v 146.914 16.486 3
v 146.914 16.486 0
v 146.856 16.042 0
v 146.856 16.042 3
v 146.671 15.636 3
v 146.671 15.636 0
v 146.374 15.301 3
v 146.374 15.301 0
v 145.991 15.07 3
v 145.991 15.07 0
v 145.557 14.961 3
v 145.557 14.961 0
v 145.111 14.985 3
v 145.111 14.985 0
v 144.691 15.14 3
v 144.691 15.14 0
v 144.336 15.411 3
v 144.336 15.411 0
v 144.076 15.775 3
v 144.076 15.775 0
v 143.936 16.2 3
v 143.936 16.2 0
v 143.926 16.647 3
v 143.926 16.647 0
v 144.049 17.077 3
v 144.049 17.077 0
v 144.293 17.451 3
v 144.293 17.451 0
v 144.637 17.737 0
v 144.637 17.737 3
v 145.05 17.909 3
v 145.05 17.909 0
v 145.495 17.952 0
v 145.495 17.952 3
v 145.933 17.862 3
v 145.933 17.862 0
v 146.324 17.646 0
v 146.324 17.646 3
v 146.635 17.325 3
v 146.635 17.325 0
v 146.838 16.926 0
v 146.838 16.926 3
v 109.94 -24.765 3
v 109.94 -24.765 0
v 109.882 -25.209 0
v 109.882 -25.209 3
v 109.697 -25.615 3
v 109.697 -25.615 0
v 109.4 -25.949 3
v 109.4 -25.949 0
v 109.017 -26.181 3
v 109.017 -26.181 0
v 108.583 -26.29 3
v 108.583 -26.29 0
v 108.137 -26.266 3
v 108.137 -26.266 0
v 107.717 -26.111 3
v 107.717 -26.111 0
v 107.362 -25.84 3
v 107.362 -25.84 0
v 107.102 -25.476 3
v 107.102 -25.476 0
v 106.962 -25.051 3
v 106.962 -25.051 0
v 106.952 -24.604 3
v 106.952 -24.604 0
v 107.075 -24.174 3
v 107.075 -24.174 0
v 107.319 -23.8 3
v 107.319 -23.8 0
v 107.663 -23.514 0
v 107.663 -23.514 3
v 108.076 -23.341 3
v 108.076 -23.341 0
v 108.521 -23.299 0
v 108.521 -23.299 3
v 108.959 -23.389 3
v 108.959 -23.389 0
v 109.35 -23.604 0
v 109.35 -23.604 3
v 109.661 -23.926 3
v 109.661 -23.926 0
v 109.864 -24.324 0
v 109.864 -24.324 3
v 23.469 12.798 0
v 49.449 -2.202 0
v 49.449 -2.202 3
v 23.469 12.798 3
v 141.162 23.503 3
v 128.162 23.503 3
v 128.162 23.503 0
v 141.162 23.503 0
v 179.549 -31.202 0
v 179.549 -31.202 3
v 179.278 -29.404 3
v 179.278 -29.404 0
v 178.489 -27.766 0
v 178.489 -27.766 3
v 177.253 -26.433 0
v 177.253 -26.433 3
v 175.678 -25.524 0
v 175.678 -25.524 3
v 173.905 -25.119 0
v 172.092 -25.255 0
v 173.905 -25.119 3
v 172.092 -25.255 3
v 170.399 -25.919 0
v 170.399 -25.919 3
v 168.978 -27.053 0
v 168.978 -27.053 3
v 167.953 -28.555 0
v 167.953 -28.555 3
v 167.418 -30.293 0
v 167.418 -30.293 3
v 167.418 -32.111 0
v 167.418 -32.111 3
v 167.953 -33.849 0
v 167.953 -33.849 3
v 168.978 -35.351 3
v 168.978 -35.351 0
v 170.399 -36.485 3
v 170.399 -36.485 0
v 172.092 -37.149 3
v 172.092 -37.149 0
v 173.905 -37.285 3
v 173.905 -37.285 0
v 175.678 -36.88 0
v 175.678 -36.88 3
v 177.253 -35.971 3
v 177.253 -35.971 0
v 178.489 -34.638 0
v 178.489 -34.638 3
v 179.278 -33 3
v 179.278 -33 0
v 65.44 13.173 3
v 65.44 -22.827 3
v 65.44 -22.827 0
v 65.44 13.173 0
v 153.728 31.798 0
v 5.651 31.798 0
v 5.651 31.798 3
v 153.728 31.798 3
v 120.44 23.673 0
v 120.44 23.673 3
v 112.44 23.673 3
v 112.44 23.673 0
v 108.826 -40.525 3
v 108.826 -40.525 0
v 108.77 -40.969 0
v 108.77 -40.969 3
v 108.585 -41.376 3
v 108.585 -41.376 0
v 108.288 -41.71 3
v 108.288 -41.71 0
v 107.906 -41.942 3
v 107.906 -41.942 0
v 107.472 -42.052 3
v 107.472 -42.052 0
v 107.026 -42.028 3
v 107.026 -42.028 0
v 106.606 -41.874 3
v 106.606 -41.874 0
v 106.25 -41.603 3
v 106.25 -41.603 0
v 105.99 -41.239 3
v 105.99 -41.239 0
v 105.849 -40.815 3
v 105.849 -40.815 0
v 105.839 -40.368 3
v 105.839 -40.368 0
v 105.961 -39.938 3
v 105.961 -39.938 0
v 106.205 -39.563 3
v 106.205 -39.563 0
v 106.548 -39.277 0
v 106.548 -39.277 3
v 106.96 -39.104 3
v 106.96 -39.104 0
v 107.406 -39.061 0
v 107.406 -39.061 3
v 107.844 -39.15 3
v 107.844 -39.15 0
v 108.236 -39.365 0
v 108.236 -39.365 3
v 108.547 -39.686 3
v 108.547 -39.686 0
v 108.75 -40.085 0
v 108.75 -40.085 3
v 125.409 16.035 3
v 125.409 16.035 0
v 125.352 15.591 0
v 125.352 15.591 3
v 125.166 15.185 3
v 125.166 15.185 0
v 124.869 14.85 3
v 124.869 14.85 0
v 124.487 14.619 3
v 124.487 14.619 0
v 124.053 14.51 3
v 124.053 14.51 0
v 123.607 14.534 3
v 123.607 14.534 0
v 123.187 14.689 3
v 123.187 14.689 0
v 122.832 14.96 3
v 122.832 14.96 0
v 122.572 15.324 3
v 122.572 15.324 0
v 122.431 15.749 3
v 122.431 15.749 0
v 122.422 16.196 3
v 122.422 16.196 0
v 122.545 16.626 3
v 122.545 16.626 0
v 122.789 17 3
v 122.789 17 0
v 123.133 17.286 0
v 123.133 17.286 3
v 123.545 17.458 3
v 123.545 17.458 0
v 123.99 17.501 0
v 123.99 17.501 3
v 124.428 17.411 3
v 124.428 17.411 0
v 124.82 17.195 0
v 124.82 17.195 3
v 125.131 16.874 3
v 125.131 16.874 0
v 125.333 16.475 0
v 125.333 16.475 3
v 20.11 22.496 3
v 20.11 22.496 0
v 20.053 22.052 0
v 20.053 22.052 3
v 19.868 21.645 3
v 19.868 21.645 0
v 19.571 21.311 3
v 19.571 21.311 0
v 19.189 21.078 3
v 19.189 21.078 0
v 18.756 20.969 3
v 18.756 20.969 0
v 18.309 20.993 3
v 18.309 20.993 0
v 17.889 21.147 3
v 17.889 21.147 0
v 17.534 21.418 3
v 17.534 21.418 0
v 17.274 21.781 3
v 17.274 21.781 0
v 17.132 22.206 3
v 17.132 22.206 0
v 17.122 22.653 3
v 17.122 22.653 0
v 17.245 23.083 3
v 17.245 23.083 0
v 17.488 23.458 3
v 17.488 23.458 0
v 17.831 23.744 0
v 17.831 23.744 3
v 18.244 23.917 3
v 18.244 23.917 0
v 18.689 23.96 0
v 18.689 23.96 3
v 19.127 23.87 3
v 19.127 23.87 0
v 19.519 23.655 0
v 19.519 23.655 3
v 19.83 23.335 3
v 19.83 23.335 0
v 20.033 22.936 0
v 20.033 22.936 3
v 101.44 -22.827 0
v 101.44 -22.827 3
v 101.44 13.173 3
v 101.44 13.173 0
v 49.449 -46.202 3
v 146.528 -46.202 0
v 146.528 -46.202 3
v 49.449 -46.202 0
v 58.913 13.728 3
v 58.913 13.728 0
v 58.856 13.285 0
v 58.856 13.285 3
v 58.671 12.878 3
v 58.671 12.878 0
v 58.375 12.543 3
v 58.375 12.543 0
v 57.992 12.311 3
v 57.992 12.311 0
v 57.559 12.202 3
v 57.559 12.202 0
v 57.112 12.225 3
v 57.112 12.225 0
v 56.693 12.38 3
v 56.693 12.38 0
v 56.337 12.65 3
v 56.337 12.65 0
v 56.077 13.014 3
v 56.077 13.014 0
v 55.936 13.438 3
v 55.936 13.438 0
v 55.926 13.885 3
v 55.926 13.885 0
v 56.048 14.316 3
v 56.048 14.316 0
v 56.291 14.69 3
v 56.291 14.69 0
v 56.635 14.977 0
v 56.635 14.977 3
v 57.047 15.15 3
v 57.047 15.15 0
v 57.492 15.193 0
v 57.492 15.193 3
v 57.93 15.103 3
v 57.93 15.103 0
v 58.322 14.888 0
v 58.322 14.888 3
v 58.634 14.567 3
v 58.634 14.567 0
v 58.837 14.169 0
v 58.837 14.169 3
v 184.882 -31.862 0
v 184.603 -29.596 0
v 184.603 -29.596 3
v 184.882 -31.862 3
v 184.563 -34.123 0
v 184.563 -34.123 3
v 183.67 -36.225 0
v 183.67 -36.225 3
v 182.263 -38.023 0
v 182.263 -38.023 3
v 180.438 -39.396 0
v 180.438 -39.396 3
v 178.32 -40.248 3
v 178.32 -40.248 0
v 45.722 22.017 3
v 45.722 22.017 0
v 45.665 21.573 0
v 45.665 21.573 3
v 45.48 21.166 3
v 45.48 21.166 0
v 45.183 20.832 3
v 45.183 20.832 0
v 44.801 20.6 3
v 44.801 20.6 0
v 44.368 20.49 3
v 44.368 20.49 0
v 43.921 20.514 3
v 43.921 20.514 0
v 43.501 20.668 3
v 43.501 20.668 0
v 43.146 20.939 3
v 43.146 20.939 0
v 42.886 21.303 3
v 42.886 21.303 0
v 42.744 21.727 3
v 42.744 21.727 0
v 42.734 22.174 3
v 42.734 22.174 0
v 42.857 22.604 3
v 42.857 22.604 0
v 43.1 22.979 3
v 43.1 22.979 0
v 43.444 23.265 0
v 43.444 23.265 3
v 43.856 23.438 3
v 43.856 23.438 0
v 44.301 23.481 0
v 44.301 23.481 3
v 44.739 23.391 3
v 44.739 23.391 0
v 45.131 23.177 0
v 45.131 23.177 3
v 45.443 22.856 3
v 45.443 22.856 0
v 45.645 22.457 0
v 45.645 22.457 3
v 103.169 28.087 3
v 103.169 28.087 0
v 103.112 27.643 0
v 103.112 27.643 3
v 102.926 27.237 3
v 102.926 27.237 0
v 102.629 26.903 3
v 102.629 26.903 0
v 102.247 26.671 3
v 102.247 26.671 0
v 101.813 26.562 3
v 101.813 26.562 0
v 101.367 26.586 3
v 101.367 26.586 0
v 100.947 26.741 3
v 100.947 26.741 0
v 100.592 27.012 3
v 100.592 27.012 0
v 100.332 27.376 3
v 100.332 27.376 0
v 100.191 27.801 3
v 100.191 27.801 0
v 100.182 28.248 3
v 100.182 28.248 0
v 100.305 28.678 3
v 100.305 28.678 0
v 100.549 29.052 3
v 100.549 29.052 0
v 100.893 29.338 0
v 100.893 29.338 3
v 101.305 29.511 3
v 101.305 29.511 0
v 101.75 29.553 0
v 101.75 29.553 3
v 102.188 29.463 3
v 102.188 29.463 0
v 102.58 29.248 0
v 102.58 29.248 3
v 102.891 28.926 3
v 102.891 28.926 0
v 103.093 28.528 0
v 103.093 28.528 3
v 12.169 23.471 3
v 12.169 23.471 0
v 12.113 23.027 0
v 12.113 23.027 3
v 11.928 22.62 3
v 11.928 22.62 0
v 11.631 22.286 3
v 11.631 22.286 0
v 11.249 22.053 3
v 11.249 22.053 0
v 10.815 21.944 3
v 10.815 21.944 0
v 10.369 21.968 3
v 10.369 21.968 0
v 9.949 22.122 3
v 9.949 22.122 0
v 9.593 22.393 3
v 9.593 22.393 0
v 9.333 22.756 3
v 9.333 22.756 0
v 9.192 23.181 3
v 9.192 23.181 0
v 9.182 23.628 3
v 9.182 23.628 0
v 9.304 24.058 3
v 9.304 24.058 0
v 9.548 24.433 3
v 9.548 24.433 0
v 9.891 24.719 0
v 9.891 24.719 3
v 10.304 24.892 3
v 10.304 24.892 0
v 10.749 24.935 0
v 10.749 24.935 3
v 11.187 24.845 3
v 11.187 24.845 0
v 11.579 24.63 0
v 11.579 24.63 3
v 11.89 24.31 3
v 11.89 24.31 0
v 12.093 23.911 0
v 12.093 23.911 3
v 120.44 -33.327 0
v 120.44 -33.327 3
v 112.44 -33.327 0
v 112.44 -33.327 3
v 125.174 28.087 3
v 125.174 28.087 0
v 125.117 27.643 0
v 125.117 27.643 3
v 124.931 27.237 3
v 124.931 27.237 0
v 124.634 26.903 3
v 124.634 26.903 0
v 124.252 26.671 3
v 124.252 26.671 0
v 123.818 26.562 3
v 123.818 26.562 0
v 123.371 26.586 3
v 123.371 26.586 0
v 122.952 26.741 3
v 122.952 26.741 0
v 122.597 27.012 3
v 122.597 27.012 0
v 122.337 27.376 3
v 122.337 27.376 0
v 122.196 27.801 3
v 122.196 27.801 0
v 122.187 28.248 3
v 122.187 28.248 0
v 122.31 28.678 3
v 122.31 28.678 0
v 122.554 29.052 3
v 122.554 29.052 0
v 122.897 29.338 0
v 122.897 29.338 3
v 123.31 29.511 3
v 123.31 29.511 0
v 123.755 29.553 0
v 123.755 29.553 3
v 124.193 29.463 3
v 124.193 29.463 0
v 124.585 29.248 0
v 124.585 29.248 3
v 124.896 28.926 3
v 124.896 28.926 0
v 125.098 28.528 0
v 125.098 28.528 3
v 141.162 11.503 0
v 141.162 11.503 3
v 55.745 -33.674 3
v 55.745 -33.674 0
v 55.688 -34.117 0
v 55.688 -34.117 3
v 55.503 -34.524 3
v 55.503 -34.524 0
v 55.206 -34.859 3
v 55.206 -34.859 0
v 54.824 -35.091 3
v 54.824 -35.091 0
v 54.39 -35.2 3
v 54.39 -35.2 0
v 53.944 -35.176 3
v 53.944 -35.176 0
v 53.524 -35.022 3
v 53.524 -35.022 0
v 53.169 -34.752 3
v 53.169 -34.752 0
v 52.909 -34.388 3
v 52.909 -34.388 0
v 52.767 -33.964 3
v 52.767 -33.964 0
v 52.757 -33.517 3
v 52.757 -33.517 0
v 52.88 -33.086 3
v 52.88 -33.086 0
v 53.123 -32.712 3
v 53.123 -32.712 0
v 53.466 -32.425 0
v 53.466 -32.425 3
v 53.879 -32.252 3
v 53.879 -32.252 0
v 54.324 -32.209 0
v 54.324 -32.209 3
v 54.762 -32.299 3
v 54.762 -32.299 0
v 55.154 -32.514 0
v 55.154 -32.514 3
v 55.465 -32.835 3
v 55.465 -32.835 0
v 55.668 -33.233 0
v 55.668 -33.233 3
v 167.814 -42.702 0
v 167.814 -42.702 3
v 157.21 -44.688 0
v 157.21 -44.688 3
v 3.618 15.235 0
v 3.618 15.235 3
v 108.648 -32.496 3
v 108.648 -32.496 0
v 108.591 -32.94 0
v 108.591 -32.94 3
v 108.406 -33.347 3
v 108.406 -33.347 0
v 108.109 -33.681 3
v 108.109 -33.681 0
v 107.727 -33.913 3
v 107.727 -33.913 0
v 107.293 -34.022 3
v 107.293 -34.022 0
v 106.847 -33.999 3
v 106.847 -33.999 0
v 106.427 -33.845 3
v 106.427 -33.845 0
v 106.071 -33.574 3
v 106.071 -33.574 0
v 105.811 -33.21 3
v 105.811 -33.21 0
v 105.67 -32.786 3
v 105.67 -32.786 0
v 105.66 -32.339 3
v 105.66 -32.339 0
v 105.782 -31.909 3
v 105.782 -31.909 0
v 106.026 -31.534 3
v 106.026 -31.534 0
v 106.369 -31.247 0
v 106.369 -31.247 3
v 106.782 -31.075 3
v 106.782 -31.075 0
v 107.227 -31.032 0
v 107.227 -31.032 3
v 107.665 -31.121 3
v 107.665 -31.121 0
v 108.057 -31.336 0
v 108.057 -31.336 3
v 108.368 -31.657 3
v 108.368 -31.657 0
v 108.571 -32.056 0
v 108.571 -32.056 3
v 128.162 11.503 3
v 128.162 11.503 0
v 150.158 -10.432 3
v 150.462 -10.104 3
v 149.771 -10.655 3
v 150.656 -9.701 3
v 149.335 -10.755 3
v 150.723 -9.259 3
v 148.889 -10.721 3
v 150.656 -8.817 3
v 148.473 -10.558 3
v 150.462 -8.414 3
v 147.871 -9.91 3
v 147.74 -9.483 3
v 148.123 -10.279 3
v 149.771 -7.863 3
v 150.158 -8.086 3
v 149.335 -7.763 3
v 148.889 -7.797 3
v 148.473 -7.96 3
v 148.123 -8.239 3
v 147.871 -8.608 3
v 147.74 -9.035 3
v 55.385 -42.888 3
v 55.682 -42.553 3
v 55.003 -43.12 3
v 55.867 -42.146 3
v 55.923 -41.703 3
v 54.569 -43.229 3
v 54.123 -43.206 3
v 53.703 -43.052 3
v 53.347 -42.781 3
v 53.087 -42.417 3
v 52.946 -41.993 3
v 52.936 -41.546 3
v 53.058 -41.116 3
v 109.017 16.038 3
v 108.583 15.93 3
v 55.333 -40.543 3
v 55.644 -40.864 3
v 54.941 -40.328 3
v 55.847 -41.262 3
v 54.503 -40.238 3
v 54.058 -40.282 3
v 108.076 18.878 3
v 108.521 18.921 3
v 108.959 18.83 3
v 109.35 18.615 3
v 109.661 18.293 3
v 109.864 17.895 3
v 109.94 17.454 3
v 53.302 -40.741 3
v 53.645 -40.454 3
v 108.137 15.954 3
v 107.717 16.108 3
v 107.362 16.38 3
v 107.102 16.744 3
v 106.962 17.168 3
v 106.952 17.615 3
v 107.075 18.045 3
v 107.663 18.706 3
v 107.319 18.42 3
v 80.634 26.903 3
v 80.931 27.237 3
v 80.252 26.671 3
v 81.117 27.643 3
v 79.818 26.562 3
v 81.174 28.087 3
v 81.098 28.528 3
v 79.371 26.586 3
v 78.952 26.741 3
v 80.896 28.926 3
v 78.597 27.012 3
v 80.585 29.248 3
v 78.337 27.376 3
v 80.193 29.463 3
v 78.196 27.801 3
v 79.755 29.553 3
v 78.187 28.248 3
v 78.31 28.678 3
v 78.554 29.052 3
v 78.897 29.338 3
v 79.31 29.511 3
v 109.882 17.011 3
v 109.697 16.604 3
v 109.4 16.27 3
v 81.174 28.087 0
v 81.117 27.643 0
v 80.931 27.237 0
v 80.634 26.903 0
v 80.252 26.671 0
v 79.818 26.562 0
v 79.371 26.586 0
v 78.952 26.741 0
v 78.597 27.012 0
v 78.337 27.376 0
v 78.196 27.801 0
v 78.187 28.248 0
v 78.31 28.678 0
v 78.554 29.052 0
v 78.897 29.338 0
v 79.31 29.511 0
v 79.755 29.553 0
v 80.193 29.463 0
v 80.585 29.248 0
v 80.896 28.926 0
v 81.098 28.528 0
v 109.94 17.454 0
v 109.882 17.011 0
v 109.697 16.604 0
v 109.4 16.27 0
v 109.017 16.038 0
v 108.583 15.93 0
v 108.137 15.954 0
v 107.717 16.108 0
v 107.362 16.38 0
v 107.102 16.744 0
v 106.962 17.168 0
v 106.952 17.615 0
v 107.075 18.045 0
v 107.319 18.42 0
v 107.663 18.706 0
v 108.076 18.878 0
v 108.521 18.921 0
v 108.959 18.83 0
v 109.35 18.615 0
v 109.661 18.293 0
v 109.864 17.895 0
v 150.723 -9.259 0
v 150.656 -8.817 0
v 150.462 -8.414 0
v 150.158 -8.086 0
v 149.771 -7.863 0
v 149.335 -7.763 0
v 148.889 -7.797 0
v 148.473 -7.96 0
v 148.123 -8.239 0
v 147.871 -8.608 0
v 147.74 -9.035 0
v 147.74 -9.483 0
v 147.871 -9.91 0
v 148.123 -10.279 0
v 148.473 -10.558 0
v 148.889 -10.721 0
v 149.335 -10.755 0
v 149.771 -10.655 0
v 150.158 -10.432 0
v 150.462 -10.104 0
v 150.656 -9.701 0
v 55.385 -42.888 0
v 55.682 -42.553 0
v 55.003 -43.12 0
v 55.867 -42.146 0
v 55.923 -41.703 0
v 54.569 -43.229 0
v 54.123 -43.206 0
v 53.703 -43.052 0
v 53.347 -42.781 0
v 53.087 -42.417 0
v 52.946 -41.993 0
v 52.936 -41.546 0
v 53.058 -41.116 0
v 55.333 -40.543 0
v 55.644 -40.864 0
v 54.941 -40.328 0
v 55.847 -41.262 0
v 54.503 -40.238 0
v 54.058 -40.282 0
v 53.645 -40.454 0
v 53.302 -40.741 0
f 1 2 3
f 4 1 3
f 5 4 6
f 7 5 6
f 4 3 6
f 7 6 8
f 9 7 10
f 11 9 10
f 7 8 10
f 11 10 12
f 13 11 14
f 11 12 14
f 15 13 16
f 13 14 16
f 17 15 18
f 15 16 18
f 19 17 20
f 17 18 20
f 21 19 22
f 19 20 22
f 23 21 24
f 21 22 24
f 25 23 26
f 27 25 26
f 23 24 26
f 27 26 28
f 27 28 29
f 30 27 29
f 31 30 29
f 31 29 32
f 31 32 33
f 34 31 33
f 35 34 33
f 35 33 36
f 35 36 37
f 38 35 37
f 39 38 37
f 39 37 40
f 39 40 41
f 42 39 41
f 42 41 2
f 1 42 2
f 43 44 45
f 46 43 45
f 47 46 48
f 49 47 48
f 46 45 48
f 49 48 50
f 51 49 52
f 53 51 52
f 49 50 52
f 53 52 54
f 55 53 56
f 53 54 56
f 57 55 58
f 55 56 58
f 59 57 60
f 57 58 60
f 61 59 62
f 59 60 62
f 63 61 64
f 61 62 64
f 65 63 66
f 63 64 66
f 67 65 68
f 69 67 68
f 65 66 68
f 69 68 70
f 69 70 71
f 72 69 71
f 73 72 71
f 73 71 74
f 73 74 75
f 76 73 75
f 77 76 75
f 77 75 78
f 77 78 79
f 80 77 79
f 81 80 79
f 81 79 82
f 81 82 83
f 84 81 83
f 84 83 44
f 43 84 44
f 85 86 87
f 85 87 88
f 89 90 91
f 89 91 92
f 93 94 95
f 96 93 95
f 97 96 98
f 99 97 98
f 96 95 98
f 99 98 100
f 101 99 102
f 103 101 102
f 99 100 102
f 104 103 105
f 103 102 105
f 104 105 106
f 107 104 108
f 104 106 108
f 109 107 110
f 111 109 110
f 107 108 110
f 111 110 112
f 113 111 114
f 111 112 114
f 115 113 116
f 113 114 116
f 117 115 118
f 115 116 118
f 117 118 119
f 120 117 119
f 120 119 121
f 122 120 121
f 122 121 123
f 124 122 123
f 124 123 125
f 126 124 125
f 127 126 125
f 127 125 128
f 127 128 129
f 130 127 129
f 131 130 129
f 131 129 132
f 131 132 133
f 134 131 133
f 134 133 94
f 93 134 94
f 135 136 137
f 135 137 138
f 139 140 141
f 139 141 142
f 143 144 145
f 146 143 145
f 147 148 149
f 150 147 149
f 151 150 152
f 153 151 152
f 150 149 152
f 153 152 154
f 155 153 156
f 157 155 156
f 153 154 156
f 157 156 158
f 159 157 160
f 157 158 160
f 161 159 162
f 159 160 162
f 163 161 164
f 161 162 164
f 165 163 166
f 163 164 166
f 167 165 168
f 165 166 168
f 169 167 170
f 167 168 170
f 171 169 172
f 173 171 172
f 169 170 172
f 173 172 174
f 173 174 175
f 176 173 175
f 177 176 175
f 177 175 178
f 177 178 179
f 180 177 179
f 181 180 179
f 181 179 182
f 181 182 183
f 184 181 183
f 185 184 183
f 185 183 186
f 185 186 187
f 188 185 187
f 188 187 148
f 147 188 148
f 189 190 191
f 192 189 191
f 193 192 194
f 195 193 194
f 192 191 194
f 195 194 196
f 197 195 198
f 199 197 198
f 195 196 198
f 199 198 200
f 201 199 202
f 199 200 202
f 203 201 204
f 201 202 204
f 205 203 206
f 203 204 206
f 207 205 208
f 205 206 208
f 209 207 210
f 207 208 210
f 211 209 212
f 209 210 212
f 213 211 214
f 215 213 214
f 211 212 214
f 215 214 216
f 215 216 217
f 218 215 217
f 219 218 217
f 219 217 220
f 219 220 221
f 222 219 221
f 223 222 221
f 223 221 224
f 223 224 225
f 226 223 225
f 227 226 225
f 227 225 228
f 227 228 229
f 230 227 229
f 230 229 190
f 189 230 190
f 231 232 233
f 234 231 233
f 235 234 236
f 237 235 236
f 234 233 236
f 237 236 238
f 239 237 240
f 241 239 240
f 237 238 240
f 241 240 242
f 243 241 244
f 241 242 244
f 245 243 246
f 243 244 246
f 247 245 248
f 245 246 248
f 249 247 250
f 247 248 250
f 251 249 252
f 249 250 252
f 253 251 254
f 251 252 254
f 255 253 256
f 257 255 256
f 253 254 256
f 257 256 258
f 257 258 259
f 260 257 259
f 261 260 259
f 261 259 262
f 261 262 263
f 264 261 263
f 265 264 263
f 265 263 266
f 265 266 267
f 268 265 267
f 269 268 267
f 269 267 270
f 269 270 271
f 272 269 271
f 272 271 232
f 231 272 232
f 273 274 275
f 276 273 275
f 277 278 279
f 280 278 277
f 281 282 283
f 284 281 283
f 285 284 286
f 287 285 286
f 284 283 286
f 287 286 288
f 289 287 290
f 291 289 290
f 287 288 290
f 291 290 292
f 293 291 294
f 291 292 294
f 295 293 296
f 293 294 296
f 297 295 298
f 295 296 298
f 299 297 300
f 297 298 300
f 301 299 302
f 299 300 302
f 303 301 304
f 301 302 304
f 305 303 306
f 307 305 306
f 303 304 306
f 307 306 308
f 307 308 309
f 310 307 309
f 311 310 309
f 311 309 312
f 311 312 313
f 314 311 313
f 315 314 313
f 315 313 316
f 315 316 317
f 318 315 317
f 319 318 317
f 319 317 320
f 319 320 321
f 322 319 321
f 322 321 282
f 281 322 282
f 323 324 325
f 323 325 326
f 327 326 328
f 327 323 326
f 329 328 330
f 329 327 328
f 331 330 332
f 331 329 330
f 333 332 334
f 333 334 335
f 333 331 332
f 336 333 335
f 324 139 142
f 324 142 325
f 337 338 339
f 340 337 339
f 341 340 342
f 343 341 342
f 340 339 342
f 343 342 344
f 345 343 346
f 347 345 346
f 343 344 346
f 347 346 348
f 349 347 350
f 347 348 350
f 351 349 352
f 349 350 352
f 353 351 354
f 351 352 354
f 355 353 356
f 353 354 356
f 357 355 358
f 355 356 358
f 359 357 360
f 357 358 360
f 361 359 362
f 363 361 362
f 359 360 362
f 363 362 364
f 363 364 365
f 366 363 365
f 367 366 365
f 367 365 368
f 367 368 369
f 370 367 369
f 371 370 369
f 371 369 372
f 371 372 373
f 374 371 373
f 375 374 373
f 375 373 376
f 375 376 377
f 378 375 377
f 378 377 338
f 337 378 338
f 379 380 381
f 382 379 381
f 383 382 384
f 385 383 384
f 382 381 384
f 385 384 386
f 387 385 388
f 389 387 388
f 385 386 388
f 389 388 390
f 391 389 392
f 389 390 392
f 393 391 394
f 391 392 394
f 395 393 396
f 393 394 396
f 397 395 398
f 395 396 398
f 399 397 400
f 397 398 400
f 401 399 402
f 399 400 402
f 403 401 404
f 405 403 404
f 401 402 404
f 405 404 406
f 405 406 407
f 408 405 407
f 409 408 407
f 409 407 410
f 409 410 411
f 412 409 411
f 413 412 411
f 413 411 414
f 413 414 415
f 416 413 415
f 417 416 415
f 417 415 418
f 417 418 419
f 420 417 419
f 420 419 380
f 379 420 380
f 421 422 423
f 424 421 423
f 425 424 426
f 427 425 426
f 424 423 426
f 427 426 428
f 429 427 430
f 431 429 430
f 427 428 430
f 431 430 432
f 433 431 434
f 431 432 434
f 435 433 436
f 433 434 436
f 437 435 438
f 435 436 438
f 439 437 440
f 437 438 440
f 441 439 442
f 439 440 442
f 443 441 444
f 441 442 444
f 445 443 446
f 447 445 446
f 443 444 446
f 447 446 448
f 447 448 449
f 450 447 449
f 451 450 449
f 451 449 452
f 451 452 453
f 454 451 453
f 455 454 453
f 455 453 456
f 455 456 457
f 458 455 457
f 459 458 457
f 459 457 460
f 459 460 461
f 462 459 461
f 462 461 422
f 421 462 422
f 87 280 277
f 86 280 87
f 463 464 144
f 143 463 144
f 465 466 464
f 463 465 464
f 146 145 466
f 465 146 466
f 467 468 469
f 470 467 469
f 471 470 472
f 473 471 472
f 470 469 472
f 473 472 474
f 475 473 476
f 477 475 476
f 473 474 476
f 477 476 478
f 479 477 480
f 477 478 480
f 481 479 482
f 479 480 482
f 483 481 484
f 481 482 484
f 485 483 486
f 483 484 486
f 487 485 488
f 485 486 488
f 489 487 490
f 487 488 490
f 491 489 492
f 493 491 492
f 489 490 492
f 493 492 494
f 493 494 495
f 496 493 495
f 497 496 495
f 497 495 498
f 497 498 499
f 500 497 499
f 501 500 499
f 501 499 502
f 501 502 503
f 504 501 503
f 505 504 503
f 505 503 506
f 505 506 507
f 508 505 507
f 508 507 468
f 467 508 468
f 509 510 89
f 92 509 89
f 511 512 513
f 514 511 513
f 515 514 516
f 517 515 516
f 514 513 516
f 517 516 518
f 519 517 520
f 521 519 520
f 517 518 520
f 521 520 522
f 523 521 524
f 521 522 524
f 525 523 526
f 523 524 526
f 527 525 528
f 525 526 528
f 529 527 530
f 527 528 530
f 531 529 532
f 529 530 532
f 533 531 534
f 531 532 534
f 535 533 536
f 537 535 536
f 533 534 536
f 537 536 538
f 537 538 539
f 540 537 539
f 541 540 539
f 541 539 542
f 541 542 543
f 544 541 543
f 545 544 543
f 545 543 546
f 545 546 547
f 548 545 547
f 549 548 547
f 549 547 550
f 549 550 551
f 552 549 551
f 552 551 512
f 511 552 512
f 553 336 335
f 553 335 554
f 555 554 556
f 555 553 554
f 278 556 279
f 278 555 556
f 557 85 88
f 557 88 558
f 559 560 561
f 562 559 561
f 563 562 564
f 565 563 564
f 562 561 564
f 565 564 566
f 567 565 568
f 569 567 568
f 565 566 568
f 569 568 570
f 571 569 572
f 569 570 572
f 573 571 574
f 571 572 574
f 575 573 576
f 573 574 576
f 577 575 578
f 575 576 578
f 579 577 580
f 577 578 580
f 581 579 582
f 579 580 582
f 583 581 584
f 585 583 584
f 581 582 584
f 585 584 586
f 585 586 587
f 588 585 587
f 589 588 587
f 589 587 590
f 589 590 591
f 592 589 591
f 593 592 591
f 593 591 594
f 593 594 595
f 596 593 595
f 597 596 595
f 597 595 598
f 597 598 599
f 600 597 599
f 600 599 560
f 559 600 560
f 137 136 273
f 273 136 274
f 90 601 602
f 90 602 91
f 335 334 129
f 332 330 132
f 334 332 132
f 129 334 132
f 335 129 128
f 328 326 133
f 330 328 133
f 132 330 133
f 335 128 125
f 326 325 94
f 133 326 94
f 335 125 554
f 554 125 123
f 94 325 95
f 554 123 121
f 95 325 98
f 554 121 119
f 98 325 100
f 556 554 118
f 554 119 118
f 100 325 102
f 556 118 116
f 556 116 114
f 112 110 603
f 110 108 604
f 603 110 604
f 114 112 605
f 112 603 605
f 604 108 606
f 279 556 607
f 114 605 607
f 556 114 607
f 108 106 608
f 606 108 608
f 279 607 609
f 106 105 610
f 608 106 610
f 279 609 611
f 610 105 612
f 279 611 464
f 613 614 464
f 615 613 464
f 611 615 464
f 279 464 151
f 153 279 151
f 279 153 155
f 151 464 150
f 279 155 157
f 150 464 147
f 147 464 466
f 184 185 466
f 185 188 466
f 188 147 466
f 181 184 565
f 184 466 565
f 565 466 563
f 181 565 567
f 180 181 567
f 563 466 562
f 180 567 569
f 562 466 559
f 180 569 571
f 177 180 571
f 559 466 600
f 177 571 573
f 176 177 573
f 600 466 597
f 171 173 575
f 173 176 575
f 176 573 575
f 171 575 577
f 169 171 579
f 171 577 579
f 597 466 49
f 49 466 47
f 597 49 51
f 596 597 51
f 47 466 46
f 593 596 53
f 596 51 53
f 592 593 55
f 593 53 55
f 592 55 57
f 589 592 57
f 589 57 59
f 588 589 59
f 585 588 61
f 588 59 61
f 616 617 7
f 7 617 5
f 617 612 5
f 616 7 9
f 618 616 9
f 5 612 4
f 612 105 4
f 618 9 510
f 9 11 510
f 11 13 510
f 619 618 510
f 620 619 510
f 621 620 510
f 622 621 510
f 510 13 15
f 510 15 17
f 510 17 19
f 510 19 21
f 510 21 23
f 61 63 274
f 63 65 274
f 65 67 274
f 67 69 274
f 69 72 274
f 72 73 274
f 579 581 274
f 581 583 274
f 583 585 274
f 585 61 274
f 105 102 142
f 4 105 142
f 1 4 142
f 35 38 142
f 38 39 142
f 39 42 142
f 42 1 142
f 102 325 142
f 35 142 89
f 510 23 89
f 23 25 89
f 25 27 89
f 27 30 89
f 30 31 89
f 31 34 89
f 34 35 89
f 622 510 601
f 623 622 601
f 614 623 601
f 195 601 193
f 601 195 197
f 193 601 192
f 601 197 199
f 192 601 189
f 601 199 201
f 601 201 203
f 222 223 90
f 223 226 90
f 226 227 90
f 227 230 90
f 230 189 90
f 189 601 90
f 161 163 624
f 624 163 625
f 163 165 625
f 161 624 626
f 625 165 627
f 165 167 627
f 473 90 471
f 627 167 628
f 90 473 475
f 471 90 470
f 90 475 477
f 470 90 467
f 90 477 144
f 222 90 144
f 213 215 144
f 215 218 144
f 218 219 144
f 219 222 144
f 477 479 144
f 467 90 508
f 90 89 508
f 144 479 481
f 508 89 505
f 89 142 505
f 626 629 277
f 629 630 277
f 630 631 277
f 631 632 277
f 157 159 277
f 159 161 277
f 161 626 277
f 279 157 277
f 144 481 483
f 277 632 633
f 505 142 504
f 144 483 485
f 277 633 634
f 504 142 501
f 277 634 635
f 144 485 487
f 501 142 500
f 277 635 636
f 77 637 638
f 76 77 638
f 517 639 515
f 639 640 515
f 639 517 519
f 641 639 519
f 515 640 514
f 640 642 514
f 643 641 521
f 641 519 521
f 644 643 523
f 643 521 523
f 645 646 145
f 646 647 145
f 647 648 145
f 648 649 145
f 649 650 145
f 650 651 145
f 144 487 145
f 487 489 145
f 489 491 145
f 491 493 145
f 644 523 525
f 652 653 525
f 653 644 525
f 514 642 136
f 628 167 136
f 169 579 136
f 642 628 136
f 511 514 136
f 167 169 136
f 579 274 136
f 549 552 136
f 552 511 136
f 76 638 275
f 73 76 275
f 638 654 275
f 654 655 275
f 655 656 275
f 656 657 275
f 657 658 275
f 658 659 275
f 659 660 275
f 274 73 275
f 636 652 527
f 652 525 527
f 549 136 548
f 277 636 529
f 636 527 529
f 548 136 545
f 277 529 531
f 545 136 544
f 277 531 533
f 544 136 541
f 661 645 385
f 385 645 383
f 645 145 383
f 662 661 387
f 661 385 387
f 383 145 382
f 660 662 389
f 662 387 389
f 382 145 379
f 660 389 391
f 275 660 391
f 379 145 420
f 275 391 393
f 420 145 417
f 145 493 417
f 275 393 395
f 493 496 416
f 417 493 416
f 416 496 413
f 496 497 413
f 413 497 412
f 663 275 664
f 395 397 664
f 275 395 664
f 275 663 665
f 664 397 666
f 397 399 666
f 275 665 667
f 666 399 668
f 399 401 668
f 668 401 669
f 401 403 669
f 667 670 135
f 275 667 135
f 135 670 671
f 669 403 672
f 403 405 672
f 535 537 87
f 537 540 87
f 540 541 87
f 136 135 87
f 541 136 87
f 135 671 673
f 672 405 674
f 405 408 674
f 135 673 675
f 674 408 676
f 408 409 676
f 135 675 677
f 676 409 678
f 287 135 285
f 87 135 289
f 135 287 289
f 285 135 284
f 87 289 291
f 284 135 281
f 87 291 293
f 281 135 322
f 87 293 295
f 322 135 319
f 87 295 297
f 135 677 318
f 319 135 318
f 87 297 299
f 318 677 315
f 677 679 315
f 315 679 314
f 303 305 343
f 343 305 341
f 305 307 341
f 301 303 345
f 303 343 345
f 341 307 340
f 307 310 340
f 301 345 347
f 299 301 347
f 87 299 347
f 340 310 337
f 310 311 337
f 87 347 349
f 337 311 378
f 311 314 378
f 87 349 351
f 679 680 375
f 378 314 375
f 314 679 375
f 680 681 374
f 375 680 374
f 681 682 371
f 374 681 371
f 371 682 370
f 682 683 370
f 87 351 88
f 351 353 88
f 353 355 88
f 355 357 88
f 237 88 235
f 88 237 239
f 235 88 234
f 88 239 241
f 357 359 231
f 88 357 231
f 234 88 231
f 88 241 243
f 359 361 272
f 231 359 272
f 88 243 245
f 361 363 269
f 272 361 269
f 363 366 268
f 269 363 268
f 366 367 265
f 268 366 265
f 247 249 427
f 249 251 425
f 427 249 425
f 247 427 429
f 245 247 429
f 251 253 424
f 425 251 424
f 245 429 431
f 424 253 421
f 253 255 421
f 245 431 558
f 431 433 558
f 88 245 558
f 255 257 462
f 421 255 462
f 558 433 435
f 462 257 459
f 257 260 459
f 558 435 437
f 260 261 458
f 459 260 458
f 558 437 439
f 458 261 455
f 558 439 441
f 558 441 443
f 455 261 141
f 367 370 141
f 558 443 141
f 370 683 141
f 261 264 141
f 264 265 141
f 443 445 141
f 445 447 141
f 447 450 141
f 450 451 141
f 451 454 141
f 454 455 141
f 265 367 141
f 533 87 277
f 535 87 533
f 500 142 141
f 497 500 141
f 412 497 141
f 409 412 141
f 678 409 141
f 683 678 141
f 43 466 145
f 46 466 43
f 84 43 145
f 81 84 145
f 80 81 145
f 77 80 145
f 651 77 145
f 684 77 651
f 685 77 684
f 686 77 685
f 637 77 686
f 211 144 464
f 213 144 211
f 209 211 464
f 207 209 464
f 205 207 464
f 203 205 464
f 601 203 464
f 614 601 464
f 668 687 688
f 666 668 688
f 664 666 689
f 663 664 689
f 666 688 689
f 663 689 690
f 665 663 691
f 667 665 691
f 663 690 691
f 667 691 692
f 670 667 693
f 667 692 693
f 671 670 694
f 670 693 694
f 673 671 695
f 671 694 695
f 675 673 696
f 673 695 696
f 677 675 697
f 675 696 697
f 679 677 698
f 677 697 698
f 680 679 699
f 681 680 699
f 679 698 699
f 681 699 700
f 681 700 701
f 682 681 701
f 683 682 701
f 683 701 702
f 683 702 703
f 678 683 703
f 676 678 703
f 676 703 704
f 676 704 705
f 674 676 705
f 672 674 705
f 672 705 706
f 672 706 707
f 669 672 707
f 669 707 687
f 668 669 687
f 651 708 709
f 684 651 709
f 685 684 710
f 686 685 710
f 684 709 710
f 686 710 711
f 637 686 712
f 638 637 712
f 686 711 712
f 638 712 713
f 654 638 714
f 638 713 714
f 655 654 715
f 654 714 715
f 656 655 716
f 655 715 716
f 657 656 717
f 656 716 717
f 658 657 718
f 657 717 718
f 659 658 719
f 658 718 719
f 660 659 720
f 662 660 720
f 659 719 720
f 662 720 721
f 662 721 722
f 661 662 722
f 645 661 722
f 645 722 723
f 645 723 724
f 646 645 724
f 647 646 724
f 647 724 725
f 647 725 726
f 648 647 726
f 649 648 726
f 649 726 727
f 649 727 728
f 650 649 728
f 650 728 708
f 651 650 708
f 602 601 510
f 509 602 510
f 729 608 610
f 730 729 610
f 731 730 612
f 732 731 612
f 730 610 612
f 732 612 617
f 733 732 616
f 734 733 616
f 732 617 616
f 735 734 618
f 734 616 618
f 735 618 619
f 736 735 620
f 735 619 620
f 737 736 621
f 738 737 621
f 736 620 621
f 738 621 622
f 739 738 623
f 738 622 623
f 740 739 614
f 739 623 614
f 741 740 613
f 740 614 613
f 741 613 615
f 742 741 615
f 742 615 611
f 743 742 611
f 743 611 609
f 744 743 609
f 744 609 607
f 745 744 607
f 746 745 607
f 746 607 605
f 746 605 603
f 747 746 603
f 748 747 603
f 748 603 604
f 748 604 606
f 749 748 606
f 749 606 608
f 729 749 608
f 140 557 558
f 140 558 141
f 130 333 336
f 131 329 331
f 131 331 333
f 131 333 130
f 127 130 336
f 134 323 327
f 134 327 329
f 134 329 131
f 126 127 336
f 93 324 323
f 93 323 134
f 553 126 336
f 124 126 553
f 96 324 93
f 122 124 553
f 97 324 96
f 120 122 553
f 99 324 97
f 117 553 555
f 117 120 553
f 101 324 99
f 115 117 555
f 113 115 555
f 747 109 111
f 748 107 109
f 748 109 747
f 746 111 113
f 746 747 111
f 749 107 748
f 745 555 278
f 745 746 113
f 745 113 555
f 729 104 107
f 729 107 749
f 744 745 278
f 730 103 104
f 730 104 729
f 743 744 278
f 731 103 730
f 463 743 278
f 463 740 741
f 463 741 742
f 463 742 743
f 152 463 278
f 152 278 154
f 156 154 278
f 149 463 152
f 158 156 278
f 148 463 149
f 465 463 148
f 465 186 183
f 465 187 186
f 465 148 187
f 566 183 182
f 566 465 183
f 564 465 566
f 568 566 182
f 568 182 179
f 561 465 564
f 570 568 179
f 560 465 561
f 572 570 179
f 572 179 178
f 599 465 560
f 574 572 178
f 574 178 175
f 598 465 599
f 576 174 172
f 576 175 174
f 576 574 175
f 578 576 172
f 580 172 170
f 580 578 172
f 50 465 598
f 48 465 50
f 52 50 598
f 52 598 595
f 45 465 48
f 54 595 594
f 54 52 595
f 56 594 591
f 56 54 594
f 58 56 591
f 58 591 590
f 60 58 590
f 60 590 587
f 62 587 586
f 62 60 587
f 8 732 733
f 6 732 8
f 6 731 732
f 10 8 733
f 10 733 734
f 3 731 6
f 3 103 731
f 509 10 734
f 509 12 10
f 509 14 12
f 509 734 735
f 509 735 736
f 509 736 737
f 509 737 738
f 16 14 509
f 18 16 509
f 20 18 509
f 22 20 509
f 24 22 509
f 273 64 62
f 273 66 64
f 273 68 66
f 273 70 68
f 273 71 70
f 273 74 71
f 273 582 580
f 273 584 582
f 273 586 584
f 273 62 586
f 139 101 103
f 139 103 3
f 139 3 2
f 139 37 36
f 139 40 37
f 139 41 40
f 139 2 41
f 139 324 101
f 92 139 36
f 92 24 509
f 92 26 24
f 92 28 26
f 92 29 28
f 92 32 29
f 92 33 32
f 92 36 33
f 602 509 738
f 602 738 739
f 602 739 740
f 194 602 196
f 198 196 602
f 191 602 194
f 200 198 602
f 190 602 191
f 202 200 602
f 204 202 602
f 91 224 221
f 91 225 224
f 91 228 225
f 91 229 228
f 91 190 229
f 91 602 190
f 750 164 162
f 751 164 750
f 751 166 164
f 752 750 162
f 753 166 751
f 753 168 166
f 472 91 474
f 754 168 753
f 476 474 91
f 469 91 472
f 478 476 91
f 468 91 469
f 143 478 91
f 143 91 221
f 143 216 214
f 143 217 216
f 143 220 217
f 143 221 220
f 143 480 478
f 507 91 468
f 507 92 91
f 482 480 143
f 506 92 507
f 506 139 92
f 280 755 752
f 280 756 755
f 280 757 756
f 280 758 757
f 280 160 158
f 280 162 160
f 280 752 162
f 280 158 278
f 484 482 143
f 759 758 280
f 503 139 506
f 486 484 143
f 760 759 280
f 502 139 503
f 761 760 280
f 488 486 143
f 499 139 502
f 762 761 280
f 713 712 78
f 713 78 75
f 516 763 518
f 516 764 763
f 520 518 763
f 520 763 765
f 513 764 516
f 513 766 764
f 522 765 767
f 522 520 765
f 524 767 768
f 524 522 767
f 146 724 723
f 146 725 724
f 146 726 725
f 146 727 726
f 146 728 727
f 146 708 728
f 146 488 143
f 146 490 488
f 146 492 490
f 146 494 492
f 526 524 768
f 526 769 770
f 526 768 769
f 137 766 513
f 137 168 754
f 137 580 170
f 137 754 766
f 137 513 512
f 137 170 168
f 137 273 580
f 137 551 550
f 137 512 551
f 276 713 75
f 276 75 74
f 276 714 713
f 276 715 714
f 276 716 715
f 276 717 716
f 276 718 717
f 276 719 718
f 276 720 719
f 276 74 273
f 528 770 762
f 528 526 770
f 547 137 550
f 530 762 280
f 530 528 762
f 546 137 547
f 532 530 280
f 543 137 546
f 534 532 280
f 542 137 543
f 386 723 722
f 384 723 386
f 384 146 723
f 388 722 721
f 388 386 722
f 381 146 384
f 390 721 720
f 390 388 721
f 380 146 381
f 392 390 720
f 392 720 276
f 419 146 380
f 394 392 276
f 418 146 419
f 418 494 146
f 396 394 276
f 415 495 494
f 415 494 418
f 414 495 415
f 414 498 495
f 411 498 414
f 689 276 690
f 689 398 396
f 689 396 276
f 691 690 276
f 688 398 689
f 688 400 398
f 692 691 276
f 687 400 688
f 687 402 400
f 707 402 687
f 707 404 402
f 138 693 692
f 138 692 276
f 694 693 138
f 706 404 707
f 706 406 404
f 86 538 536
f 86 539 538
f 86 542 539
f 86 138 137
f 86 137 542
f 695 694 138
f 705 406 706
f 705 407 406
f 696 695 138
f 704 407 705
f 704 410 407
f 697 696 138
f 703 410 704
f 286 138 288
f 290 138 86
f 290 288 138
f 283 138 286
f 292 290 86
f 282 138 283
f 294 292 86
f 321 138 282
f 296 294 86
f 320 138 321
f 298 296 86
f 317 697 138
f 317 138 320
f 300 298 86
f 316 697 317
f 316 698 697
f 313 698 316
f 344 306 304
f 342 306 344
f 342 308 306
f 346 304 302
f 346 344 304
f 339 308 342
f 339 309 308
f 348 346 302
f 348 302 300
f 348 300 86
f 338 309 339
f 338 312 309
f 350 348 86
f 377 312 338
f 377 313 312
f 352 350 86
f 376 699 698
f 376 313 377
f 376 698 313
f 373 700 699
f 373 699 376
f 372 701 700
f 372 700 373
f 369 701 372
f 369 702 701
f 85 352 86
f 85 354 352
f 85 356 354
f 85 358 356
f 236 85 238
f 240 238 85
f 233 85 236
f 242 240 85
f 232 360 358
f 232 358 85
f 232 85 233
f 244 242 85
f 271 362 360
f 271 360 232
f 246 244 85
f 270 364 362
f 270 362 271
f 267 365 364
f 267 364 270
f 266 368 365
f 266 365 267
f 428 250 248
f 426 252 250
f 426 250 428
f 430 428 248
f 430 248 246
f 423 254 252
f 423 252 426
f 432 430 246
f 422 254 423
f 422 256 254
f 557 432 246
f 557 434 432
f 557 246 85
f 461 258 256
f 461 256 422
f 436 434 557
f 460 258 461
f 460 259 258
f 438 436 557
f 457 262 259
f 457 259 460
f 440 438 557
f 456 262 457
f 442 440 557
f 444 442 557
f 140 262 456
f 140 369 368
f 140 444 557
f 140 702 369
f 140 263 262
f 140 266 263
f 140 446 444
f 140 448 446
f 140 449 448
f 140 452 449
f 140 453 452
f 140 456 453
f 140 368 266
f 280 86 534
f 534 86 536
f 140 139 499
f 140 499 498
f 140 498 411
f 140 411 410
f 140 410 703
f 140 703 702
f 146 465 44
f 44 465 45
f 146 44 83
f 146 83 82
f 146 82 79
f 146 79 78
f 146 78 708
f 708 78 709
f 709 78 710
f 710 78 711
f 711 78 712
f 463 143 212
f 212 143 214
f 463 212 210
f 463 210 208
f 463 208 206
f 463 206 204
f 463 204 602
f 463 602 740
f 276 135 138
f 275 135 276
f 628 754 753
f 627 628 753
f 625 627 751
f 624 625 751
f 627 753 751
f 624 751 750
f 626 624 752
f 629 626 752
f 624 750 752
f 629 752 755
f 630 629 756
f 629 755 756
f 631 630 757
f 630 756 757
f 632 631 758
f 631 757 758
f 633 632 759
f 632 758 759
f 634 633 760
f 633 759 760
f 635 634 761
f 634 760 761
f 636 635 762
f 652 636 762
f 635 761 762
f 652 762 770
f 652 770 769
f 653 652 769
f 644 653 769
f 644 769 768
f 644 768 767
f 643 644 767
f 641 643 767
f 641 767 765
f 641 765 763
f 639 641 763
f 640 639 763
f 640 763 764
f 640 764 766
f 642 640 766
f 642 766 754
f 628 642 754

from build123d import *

# Parameters (mm, degrees)
EXTRUDE_1_DEPTH     = 3
CUT_EXTRUDE_1_REACH = 5
SKETCH_2_R          = 6.1
SKETCH_2_W          = 36
SKETCH_2_H          = 36
MM_CLEARANCE_1_D    = 3
MM_CLEARANCE_4_D    = 3
CUT_EXTRUDE_2_REACH = 5
SKETCH_18_R         = 1.5
MM_CLEARANCE_6_D    = 3
CUT_EXTRUDE_3_REACH = 5
SKETCH_21_W         = 13
SKETCH_21_H         = 12
MM_CLEARANCE_7_D    = 3
MM_CLEARANCE_10_D   = 3


with BuildPart() as part:
    # 草图1 → 凸台-拉伸1 (new body)
    with BuildSketch(Plane.XY):
        with BuildLine():
            Line((30.367519571, 31.798067496), (153.728402084, 31.798067496))
            Line((153.728402084, 31.798067496), (184.602796718, -29.595613307))
            ThreePointArc((184.602796718, -29.595613307), (183.670445617, -36.224755467), (178.320075375, -40.248229416))
            ThreePointArc((178.320075375, -40.248229416), (162.522923857, -43.753908616), (146.527707017, -46.201932504))
            Line((146.527707017, -46.201932504), (49.449368769, -46.201932504))
            Line((49.449368769, -46.201932504), (49.449368769, -2.201932504))
            Line((49.449368769, -2.201932504), (23.468606655, 12.798067496))
            Line((23.468606655, 12.798067496), (3.617683623, 15.235454364))
            Line((3.617683623, 15.235454364), (5.651316803, 31.798067496))
            Line((5.651316803, 31.798067496), (5.659575981, 31.798067496))
            Line((5.659575981, 31.798067496), (30.367519571, 31.798067496))
        make_face()
    extrude(amount=EXTRUDE_1_DEPTH)

    # 草图2 → 切除-拉伸1 (cut, up to next)
    with BuildSketch(Plane.XY.offset(3), mode=Mode.PRIVATE) as cut_extrude_1_sk1:
        with Locations((173.449368769, -31.201932504)):
            Circle(SKETCH_2_R)
    cut_extrude_1_tool1 = extrude(cut_extrude_1_sk1.sketch, amount=-CUT_EXTRUDE_1_REACH, mode=Mode.PRIVATE) & part.part
    add(cut_extrude_1_tool1.solids().sort_by_distance((173.449369, -31.201933, 3))[0], mode=Mode.SUBTRACT)
    # 草图2 → 切除-拉伸1 (cut, up to next)
    with BuildSketch(Plane.XY.offset(3), mode=Mode.PRIVATE) as cut_extrude_1_sk2:
        with Locations((83.439887491, -4.827295438)):
            Rectangle(SKETCH_2_W, SKETCH_2_H)
    cut_extrude_1_tool2 = extrude(cut_extrude_1_sk2.sketch, amount=-CUT_EXTRUDE_1_REACH, mode=Mode.PRIVATE) & part.part
    add(cut_extrude_1_tool2.solids().sort_by_distance((83.439887, -4.827295, 3))[0], mode=Mode.SUBTRACT)
    # 草图2 → 切除-拉伸1 (cut, up to next)
    with BuildSketch(Plane.XY.offset(3), mode=Mode.PRIVATE) as cut_extrude_1_sk3:
        Polygon((112.439887491, -4.827295438), (112.439887491, -33.327295438), (120.439887491, -33.327295438), (120.439887491, 23.672704562), (112.439887491, 23.672704562), align=None)
    cut_extrude_1_tool3 = extrude(cut_extrude_1_sk3.sketch, amount=-CUT_EXTRUDE_1_REACH, mode=Mode.PRIVATE) & part.part
    add(cut_extrude_1_tool3.solids().sort_by_distance((116.439887, -4.827295, 3))[0], mode=Mode.SUBTRACT)

    # 大小mm Clearance 暗销孔1 (through all)
    with Locations(Plane(origin=(141.673702765, 151.858231724, 3), x_dir=(-0.99978014, -0.020968354, 0), z_dir=(0, 0, 1))):
        with Locations((20.591231353, 123.39816829), (42.591231353, 122.936763059), (64.581557509, 122.475560716)):
            Hole(MM_CLEARANCE_1_D / 2)

    # 大小mm Clearance 暗销孔4 (through all)
    with Locations(Plane(origin=(141.673702765, 151.858231724, 3), x_dir=(-0.99978014, -0.020968354, 0), z_dir=(0, 0, 1))):
        with Locations((20.608818994, 135.452556109), (-0.900285243, 135.452556109)):
            Hole(MM_CLEARANCE_4_D / 2)

    # 草图18 → 切除-拉伸2 (cut, up to next)
    with BuildSketch(Plane.XY.offset(3), mode=Mode.PRIVATE) as cut_extrude_2_sk1:
        with Locations((149.222841692, -9.258973797)):
            Circle(SKETCH_18_R)
    cut_extrude_2_tool1 = extrude(cut_extrude_2_sk1.sketch, amount=-CUT_EXTRUDE_2_REACH, mode=Mode.PRIVATE) & part.part
    add(cut_extrude_2_tool1.solids().sort_by_distance((149.222842, -9.258974, 3))[0], mode=Mode.SUBTRACT)

    # 大小mm Clearance 暗销孔6 (through all)
    with Locations(Plane(origin=(141.673702765, 151.858231724, 3), x_dir=(-0.99978014, -0.020968354, 0), z_dir=(0, 0, 1))):
        with Locations((36.045400202, 133.709111751), (36.930668673, 175.919093371)):
            Hole(MM_CLEARANCE_6_D / 2)

    # 草图21 → 切除-拉伸3 (cut, up to next)
    with BuildSketch(Plane.XY.offset(3), mode=Mode.PRIVATE) as cut_extrude_3_sk1:
        with Locations((134.661819591, 17.503323217)):
            Rectangle(SKETCH_21_W, SKETCH_21_H)
    cut_extrude_3_tool1 = extrude(cut_extrude_3_sk1.sketch, amount=-CUT_EXTRUDE_3_REACH, mode=Mode.PRIVATE) & part.part
    add(cut_extrude_3_tool1.solids().sort_by_distance((134.66182, 17.503323, 3))[0], mode=Mode.SUBTRACT)

    # 大小mm Clearance 暗销孔7 (through all)
    with Locations(Plane(origin=(143.321207743, 150.868006211, 3), x_dir=(-0.99975237, -0.022253058, 0), z_dir=(0, 0, 1))):
        with Locations((88.938953066, 135.227377046), (101.942467158, 126.647536361), (127.53759353, 125.598807912), (135.454300746, 124.4473971)):
            Hole(MM_CLEARANCE_7_D / 2)

    # 大小mm Clearance 暗销孔10 (through all)
    with Locations(Plane(origin=(143.321207743, 150.868006211, 3), x_dir=(-0.99975237, -0.022253058, 0), z_dir=(0, 0, 1))):
        with Locations((93.161367469, 190.578219389), (93.161367469, 182.547127137), (40.245392963, 190.578219389), (40.245392963, 182.547127137)):
            Hole(MM_CLEARANCE_10_D / 2)


solid = part.part
